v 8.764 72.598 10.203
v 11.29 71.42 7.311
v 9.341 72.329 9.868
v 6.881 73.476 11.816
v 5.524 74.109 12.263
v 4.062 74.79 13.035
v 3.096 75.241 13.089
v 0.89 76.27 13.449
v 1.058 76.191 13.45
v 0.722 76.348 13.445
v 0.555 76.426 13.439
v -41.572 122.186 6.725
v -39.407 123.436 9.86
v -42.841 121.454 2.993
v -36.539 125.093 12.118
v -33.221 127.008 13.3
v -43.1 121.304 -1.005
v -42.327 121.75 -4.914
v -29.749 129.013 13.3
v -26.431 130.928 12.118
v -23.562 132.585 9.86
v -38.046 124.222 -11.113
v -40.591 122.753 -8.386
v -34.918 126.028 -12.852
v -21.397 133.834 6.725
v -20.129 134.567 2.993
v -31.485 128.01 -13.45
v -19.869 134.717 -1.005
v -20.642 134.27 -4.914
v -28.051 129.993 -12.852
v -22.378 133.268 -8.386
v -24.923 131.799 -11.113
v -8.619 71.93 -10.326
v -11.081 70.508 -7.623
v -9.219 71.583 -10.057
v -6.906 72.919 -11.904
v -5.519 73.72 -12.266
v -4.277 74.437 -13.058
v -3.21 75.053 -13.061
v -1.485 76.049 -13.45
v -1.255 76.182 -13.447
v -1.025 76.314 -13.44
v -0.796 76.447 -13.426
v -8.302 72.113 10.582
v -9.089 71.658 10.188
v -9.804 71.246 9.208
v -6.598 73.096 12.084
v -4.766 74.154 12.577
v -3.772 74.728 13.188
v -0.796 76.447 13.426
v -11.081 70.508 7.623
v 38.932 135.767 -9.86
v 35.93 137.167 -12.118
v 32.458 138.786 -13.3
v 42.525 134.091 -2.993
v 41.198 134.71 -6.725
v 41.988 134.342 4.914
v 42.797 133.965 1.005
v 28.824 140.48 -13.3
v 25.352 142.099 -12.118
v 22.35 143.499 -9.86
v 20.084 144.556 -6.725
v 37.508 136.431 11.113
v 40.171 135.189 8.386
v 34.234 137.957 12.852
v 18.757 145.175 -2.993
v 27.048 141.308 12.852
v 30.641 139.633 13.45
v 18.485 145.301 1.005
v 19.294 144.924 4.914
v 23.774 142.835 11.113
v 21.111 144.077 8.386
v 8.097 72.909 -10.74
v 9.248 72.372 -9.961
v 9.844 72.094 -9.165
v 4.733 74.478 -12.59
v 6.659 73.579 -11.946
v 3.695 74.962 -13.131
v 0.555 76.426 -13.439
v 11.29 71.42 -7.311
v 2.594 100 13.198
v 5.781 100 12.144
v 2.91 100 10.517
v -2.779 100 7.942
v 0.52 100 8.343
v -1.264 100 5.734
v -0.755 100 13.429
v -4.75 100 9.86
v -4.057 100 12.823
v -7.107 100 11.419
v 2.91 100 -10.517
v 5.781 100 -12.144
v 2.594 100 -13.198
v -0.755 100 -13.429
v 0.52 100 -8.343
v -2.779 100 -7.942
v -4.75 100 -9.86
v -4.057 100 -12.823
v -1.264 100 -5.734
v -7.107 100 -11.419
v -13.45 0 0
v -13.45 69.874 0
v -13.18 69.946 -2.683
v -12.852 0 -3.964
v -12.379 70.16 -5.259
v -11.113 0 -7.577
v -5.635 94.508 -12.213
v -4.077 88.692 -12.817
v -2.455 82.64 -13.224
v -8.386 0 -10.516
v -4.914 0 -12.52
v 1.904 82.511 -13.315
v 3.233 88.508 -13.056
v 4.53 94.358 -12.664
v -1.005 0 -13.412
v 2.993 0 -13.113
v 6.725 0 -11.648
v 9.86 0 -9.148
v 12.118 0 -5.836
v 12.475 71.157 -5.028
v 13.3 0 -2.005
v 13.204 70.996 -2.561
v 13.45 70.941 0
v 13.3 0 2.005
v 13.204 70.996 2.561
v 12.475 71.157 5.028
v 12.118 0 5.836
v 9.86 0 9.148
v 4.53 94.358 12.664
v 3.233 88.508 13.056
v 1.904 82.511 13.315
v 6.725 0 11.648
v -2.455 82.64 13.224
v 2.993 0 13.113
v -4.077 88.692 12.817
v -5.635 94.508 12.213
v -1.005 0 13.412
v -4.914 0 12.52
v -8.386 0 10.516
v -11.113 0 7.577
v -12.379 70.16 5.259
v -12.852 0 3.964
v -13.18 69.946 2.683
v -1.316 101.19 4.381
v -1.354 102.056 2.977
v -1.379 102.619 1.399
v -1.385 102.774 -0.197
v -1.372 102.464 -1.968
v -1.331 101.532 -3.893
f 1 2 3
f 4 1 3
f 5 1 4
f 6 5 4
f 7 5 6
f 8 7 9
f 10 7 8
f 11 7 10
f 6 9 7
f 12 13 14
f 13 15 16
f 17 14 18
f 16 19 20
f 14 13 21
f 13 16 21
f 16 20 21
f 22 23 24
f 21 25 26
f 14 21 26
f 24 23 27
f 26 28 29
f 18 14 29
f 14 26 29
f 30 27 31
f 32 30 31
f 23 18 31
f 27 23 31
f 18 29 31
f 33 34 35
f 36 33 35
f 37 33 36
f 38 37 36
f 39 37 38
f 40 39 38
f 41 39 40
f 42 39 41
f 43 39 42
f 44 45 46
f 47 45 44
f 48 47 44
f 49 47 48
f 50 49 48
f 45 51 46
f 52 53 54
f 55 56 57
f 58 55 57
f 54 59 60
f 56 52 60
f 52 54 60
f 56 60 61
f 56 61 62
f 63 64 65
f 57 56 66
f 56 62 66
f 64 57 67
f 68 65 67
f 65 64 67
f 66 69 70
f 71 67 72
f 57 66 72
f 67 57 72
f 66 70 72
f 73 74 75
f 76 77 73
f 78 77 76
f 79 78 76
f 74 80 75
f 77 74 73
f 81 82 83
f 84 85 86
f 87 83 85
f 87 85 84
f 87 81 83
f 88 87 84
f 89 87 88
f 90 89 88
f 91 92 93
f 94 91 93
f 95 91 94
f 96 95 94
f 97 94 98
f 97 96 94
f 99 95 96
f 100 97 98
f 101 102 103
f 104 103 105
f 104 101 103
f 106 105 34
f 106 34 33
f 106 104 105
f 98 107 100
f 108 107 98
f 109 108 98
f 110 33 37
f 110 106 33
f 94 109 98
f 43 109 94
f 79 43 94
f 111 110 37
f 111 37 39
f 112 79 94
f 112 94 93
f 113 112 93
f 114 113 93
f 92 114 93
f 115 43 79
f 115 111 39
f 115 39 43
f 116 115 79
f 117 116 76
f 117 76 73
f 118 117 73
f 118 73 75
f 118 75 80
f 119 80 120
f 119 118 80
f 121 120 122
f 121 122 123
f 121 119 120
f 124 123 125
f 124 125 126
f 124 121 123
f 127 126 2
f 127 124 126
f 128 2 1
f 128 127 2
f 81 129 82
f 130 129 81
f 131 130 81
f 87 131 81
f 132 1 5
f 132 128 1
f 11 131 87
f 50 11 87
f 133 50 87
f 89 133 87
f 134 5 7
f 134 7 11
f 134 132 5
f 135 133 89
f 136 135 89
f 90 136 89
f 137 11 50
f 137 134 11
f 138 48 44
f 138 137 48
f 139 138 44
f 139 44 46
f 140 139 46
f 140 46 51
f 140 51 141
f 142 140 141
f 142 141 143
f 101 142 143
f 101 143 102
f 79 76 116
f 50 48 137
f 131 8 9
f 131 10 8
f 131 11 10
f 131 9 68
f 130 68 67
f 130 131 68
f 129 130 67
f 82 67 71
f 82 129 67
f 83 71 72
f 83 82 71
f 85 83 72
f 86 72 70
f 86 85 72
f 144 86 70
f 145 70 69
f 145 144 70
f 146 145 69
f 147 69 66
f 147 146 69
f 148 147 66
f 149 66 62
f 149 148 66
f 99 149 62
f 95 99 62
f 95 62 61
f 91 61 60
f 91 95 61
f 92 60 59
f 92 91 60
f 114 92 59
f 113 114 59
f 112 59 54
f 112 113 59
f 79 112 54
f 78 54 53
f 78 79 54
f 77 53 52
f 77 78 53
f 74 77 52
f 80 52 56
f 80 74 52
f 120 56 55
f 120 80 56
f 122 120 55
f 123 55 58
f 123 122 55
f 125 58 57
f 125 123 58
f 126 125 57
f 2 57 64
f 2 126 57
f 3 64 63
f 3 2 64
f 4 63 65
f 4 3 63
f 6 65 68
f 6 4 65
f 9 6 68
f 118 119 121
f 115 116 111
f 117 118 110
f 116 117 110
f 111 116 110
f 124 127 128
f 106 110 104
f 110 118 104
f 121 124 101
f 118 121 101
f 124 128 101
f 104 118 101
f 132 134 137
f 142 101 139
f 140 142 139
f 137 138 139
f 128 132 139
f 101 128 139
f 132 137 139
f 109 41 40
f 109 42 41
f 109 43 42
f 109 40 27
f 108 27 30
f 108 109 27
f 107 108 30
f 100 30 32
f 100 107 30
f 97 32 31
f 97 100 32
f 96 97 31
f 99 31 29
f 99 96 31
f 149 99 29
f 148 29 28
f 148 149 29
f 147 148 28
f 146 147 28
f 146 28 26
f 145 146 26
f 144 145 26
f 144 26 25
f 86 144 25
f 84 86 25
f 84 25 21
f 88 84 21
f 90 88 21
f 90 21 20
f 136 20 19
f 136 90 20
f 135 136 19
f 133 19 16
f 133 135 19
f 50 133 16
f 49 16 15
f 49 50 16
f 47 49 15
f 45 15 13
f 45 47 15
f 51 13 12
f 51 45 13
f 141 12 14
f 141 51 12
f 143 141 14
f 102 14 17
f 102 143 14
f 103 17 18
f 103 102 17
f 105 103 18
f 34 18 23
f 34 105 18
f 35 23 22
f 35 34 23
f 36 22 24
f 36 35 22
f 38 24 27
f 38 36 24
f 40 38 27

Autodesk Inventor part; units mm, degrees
ref_plane "YZ Plane" through (0, 0, 0) normal (1, 0, 0) x (0, 1, 0)
sketch "草图1" plane through (0, 0, 0) normal (0, 1, 0) x (-1, 0, 0)
  circle A0 centre (0, 0) radius 13.45
  dimension "d0" = 26.9
extrude "拉伸1" add sketch "草图1" along normal blind 100
sketch "草图2" plane through (0, 100, 0) normal (0, 1, 0) x (1, 0, 0)
  line L0 (40, -45.1945) -> (40, 45.1945)
  line L1 (0, 0) -> (40, 0) construction
  line L2 (-50, 47.95) -> (-50, -45.1945)
  dimension "d3" = 40
  dimension "d7" = 50
ref_plane "工作平面1" through (40, 100, 45.1945) normal (0.5, -0.866, 0) x (0, 0, -1)
sketch "草图3" plane through (40, 100, 45.1945) normal (0.5, -0.866, 0) x (0, 0, -1)
  circle A0 centre (45.1945, -47.9023) radius 13.45
  line L0 (31.7445, -84.641) -> (31.7445, -34.641) projected
  line L1 (58.6445, -84.641) -> (58.6445, -34.641) projected
  point P0 (45.1945, -84.641)
extrude "拉伸2" add sketch "草图3" against normal blind 60
ref_plane "工作平面2" through (-50, 100, -47.95) normal (-0.4226, -0.9063, 0) x (0, 0, 1)
sketch "草图4" plane through (-50, 100, -47.95) normal (-0.4226, -0.9063, 0) x (0, 0, 1)
  circle A0 centre (47.95, -56.336) radius 13.45
  line L0 (61.4, -87.5772) -> (61.4, -45.3154) projected
  line L1 (34.5, -87.5772) -> (34.5, -45.3154) projected
  point P0 (47.95, -87.5772)
extrude "拉伸3" add sketch "草图4" against normal blind 70
properties part number "珊瑚" material "聚苯乙烯"
